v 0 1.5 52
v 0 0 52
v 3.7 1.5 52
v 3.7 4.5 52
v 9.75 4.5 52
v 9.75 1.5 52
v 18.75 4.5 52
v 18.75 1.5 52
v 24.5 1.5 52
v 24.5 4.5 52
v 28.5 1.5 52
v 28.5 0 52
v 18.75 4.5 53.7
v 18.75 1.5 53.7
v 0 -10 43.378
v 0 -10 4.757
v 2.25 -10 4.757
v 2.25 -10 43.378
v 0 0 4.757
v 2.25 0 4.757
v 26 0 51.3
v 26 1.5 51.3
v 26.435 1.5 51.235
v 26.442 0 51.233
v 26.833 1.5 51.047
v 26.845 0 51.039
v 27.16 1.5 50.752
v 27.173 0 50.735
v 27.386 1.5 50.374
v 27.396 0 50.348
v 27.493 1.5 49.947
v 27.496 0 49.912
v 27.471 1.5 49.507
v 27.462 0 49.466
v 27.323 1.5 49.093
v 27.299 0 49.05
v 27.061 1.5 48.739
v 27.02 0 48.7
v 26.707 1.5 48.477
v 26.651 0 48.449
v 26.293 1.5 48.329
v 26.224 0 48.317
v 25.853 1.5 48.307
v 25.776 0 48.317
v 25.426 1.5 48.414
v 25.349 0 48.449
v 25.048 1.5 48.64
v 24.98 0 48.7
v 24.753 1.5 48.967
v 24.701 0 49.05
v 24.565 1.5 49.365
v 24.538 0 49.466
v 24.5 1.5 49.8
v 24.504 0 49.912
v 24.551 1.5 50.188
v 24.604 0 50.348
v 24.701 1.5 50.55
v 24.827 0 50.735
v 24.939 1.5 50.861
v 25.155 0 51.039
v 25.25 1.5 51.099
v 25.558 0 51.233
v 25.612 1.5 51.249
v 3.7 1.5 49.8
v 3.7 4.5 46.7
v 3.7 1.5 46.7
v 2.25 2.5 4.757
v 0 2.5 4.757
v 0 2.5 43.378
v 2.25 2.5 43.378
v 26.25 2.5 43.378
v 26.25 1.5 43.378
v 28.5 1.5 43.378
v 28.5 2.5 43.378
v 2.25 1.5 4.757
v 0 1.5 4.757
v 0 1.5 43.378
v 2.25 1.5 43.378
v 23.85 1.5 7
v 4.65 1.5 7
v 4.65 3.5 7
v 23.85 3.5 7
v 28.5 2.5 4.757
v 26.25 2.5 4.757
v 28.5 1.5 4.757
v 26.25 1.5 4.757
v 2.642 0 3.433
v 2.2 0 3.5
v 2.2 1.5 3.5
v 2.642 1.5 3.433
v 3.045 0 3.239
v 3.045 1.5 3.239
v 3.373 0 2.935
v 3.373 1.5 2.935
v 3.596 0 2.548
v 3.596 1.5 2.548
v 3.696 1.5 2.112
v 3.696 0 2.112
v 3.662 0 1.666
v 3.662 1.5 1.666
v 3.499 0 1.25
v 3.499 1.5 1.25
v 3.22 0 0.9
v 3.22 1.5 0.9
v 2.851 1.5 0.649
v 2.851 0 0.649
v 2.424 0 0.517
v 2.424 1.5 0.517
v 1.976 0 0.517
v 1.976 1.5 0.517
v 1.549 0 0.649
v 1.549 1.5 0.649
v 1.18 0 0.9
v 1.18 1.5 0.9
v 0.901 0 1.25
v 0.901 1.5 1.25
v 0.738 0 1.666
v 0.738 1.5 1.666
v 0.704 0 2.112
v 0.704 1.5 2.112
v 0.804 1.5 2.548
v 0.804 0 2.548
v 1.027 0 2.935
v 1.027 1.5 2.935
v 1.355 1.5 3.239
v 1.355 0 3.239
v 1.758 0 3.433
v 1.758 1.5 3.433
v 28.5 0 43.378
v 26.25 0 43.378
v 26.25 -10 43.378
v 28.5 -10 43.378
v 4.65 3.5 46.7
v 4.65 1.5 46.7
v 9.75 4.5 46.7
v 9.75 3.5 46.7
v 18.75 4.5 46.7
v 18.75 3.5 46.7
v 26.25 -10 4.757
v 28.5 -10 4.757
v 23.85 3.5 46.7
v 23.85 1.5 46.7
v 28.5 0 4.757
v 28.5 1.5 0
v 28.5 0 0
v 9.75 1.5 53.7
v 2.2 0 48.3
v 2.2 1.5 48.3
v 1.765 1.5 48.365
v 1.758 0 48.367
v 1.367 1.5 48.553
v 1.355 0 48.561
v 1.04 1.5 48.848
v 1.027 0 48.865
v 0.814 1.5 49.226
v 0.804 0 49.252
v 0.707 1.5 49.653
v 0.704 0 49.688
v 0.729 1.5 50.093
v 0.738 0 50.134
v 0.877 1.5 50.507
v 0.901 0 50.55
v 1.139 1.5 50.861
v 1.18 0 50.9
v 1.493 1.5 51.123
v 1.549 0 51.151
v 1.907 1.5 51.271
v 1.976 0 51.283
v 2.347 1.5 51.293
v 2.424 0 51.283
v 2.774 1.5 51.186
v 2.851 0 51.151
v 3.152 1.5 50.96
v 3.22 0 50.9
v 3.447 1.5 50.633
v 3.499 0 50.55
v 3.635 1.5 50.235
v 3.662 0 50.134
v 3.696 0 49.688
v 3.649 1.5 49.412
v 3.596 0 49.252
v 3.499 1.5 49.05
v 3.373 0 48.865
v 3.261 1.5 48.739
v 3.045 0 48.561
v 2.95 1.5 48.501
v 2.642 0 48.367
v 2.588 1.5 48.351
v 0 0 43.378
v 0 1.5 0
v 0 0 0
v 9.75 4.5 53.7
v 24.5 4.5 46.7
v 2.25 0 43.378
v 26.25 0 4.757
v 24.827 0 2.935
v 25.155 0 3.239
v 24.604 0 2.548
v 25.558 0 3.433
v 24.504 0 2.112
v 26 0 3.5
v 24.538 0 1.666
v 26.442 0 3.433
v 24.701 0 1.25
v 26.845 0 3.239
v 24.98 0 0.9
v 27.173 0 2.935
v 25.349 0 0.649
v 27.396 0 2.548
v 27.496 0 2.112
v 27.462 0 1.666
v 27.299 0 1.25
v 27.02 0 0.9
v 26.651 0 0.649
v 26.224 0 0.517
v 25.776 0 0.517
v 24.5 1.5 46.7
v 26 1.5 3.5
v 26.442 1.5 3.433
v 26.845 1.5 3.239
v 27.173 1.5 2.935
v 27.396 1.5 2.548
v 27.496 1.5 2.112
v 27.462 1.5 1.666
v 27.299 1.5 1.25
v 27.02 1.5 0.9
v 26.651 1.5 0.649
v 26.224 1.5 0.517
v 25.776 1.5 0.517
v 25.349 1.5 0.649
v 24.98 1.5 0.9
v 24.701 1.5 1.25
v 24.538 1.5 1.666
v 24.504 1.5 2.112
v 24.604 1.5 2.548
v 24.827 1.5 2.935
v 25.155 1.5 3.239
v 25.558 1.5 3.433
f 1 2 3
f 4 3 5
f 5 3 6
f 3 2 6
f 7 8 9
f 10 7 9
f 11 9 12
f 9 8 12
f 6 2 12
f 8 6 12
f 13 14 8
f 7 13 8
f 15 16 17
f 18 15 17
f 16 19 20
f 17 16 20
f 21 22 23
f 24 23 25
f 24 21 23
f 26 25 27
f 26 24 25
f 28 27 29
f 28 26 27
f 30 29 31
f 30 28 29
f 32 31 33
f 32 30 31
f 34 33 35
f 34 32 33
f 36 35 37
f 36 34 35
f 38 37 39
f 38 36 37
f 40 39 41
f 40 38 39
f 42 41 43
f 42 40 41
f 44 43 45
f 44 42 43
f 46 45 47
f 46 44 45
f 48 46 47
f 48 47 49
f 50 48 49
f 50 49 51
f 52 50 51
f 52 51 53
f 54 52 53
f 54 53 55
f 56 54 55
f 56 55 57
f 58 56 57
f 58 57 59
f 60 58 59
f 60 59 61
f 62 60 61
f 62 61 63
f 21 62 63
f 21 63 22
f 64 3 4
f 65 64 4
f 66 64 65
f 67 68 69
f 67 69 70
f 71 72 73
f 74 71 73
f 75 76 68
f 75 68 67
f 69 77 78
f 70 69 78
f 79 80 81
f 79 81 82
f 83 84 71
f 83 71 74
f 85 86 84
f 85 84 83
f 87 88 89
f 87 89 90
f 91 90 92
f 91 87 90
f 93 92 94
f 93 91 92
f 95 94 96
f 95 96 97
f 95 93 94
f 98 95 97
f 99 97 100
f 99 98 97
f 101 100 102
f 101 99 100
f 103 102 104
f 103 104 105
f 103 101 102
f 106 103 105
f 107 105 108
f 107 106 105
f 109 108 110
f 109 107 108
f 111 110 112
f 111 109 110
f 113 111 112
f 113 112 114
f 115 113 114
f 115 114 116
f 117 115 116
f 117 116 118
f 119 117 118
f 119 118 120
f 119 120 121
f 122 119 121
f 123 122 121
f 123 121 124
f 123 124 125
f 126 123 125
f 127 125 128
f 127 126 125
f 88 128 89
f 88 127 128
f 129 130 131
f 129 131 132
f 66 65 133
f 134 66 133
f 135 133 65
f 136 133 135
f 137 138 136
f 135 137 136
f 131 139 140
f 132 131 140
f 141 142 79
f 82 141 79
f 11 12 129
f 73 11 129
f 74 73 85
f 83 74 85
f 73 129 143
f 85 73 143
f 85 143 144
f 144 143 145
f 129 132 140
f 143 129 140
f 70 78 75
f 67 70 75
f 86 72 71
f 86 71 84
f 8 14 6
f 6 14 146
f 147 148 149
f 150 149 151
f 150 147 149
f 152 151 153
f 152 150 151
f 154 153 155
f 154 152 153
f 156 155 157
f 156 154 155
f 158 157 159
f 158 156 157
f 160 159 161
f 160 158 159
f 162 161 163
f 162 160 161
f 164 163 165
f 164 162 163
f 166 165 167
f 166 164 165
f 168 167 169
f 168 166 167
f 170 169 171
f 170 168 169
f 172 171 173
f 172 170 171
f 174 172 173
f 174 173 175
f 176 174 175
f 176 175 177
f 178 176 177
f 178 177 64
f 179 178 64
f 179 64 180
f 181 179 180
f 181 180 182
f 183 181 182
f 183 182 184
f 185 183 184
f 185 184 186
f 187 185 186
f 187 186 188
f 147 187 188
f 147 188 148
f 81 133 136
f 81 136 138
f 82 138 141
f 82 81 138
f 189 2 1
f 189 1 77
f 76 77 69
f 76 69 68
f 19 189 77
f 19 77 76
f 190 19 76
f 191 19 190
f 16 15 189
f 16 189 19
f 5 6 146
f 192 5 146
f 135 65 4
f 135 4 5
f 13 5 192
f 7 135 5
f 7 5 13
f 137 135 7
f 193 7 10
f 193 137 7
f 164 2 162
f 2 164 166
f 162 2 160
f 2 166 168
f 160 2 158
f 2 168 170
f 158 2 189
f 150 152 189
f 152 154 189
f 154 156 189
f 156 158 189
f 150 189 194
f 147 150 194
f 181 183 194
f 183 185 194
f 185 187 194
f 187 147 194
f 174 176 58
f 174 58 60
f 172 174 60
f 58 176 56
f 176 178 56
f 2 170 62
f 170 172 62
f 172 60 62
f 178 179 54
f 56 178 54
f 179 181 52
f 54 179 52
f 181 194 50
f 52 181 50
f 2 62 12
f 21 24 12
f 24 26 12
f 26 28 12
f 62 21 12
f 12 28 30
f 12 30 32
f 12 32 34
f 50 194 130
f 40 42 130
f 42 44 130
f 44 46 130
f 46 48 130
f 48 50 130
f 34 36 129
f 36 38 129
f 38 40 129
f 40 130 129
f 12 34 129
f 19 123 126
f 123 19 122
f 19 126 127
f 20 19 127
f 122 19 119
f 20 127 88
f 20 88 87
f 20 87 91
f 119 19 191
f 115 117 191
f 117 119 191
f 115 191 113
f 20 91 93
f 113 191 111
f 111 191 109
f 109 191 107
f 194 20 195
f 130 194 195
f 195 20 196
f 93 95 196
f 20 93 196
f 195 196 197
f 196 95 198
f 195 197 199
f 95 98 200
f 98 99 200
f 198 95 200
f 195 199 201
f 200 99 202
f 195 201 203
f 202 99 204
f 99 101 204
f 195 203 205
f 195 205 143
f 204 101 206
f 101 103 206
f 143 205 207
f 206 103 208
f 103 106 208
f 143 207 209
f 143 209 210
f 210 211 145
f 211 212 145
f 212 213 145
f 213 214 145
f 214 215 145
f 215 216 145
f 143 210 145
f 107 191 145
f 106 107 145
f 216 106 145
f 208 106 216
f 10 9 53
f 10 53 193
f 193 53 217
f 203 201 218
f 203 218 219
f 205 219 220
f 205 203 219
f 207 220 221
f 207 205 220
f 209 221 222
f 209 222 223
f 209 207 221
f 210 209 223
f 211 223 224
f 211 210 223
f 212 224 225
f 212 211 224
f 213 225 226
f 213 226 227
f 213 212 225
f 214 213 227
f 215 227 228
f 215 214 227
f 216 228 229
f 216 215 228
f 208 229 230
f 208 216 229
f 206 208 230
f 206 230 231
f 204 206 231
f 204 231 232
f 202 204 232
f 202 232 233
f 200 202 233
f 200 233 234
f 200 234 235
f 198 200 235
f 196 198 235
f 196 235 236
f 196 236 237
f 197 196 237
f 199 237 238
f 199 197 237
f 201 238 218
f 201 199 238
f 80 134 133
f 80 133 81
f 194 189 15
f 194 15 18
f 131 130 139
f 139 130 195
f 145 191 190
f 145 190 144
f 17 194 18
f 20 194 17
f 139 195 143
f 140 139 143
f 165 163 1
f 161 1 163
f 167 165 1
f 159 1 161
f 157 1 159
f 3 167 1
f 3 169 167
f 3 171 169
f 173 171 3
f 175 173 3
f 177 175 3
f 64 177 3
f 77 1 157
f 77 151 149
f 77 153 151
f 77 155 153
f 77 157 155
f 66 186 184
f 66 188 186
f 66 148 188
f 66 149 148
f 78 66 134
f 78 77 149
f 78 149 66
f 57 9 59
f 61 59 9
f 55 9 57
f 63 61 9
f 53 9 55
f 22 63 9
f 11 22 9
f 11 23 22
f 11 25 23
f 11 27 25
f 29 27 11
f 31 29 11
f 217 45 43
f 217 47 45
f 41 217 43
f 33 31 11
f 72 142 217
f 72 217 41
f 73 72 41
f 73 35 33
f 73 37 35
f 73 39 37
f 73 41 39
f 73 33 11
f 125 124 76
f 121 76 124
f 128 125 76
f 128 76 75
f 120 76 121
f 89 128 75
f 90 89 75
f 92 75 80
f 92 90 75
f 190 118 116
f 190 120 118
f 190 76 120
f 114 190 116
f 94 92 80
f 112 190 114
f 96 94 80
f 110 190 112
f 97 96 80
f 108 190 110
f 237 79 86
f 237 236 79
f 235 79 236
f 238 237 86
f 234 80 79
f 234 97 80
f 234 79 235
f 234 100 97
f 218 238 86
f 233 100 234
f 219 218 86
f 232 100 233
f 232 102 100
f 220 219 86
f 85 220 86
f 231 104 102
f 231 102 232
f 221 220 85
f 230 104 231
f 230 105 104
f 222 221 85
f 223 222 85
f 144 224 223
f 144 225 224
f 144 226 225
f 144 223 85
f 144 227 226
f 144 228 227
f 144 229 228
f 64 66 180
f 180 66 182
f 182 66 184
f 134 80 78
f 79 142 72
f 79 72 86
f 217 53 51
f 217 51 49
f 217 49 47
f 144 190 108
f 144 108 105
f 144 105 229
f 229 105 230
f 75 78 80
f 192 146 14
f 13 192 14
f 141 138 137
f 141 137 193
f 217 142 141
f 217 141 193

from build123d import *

# Parameters (mm, degrees)
SKETCH_2_W      = 28.5
SKETCH_2_H      = 52
SKETCH_2_R      = 1.5
EXTRUDE_1_DEPTH = 1.5
EXTRUDE_2_DEPTH = 3
SKETCH_3_W      = 5.75
SKETCH_3_H      = 5.3
SKETCH_3_W_2    = 6.05
EXTRUDE_5_DEPTH = 3
SKETCH_5_W      = 19.2
SKETCH_5_H      = 39.7
EXTRUDE_6_DEPTH = 2
SKETCH_6_W      = 2.25
SKETCH_6_H      = 38.620640838
EXTRUDE_7_DEPTH = 1
SKETCH_6_3_W    = 2.25
SKETCH_6_3_H    = 38.620640838
EXTRUDE_8_DEPTH = 11.5


with BuildPart() as part:
    # Эскиз2 → Бобышка-Вытянуть1 (new body)
    with BuildSketch(Plane(origin=(0, 0, 0), x_dir=(1, 0, 0), z_dir=(0, 1, 0))):
        with Locations((14.25, -26)):
            Rectangle(SKETCH_2_W, SKETCH_2_H)
        with Locations((2.2, -2)):
            Circle(SKETCH_2_R, mode=Mode.SUBTRACT)
        with Locations((26, -2)):
            Circle(SKETCH_2_R, mode=Mode.SUBTRACT)
        with Locations((2.2, -49.8)):
            Circle(SKETCH_2_R, mode=Mode.SUBTRACT)
        with Locations((26, -49.8)):
            Circle(SKETCH_2_R, mode=Mode.SUBTRACT)
    extrude(amount=EXTRUDE_1_DEPTH)

    # Sketch 1 → Бобышка-Вытянуть2 (add)
    with BuildSketch(Plane(origin=(9.75, 1.5, 46.7), x_dir=(0.7893522173763263, 0, 0.6139406135149205), z_dir=(0, -1, 0))):
        Polygon((0, 0), (4.297584295, 5.525465522), (11.401754251, 0), (7.104169956, -5.525465522), align=None)
    extrude(amount=-EXTRUDE_2_DEPTH)

    # Эскиз3 → Бобышка-Вытянуть5 (add)
    with BuildSketch(Plane(origin=(0, 1.5, 0), x_dir=(1, 0, 0), z_dir=(0, 1, 0))):
        with Locations((21.625, -49.35)):
            Rectangle(SKETCH_3_W, SKETCH_3_H)
        with Locations((6.725, -49.35)):
            Rectangle(SKETCH_3_W_2, SKETCH_3_H)
    extrude(amount=EXTRUDE_5_DEPTH)

    # Эскиз5 → Бобышка-Вытянуть6 (add)
    with BuildSketch(Plane(origin=(0, 1.5, 0), x_dir=(1, 0, 0), z_dir=(0, 1, 0))):
        with Locations((14.25, -26.85)):
            Rectangle(SKETCH_5_W, SKETCH_5_H)
    extrude(amount=EXTRUDE_6_DEPTH)

    # Эскиз6 → Бобышка-Вытянуть7 (add)
    with BuildSketch(Plane(origin=(0, 1.5, 0), x_dir=(1, 0, 0), z_dir=(0, 1, 0))):
        with Locations((1.125, -24.067488006)):
            Rectangle(SKETCH_6_W, SKETCH_6_H)
        with Locations((27.375, -24.067488006)):
            Rectangle(SKETCH_6_W, SKETCH_6_H)
    extrude(amount=EXTRUDE_7_DEPTH)

    # Эскиз6<3> → Бобышка-Вытянуть8 (add)
    with BuildSketch(Plane(origin=(0, 1.5, 0), x_dir=(1, 0, 0), z_dir=(0, 1, 0))):
        with Locations((1.125, -24.067488006)):
            Rectangle(SKETCH_6_3_W, SKETCH_6_3_H)
        with Locations((27.375, -24.067488006)):
            Rectangle(SKETCH_6_3_W, SKETCH_6_3_H)
    extrude(amount=-EXTRUDE_8_DEPTH)


solid = part.part
